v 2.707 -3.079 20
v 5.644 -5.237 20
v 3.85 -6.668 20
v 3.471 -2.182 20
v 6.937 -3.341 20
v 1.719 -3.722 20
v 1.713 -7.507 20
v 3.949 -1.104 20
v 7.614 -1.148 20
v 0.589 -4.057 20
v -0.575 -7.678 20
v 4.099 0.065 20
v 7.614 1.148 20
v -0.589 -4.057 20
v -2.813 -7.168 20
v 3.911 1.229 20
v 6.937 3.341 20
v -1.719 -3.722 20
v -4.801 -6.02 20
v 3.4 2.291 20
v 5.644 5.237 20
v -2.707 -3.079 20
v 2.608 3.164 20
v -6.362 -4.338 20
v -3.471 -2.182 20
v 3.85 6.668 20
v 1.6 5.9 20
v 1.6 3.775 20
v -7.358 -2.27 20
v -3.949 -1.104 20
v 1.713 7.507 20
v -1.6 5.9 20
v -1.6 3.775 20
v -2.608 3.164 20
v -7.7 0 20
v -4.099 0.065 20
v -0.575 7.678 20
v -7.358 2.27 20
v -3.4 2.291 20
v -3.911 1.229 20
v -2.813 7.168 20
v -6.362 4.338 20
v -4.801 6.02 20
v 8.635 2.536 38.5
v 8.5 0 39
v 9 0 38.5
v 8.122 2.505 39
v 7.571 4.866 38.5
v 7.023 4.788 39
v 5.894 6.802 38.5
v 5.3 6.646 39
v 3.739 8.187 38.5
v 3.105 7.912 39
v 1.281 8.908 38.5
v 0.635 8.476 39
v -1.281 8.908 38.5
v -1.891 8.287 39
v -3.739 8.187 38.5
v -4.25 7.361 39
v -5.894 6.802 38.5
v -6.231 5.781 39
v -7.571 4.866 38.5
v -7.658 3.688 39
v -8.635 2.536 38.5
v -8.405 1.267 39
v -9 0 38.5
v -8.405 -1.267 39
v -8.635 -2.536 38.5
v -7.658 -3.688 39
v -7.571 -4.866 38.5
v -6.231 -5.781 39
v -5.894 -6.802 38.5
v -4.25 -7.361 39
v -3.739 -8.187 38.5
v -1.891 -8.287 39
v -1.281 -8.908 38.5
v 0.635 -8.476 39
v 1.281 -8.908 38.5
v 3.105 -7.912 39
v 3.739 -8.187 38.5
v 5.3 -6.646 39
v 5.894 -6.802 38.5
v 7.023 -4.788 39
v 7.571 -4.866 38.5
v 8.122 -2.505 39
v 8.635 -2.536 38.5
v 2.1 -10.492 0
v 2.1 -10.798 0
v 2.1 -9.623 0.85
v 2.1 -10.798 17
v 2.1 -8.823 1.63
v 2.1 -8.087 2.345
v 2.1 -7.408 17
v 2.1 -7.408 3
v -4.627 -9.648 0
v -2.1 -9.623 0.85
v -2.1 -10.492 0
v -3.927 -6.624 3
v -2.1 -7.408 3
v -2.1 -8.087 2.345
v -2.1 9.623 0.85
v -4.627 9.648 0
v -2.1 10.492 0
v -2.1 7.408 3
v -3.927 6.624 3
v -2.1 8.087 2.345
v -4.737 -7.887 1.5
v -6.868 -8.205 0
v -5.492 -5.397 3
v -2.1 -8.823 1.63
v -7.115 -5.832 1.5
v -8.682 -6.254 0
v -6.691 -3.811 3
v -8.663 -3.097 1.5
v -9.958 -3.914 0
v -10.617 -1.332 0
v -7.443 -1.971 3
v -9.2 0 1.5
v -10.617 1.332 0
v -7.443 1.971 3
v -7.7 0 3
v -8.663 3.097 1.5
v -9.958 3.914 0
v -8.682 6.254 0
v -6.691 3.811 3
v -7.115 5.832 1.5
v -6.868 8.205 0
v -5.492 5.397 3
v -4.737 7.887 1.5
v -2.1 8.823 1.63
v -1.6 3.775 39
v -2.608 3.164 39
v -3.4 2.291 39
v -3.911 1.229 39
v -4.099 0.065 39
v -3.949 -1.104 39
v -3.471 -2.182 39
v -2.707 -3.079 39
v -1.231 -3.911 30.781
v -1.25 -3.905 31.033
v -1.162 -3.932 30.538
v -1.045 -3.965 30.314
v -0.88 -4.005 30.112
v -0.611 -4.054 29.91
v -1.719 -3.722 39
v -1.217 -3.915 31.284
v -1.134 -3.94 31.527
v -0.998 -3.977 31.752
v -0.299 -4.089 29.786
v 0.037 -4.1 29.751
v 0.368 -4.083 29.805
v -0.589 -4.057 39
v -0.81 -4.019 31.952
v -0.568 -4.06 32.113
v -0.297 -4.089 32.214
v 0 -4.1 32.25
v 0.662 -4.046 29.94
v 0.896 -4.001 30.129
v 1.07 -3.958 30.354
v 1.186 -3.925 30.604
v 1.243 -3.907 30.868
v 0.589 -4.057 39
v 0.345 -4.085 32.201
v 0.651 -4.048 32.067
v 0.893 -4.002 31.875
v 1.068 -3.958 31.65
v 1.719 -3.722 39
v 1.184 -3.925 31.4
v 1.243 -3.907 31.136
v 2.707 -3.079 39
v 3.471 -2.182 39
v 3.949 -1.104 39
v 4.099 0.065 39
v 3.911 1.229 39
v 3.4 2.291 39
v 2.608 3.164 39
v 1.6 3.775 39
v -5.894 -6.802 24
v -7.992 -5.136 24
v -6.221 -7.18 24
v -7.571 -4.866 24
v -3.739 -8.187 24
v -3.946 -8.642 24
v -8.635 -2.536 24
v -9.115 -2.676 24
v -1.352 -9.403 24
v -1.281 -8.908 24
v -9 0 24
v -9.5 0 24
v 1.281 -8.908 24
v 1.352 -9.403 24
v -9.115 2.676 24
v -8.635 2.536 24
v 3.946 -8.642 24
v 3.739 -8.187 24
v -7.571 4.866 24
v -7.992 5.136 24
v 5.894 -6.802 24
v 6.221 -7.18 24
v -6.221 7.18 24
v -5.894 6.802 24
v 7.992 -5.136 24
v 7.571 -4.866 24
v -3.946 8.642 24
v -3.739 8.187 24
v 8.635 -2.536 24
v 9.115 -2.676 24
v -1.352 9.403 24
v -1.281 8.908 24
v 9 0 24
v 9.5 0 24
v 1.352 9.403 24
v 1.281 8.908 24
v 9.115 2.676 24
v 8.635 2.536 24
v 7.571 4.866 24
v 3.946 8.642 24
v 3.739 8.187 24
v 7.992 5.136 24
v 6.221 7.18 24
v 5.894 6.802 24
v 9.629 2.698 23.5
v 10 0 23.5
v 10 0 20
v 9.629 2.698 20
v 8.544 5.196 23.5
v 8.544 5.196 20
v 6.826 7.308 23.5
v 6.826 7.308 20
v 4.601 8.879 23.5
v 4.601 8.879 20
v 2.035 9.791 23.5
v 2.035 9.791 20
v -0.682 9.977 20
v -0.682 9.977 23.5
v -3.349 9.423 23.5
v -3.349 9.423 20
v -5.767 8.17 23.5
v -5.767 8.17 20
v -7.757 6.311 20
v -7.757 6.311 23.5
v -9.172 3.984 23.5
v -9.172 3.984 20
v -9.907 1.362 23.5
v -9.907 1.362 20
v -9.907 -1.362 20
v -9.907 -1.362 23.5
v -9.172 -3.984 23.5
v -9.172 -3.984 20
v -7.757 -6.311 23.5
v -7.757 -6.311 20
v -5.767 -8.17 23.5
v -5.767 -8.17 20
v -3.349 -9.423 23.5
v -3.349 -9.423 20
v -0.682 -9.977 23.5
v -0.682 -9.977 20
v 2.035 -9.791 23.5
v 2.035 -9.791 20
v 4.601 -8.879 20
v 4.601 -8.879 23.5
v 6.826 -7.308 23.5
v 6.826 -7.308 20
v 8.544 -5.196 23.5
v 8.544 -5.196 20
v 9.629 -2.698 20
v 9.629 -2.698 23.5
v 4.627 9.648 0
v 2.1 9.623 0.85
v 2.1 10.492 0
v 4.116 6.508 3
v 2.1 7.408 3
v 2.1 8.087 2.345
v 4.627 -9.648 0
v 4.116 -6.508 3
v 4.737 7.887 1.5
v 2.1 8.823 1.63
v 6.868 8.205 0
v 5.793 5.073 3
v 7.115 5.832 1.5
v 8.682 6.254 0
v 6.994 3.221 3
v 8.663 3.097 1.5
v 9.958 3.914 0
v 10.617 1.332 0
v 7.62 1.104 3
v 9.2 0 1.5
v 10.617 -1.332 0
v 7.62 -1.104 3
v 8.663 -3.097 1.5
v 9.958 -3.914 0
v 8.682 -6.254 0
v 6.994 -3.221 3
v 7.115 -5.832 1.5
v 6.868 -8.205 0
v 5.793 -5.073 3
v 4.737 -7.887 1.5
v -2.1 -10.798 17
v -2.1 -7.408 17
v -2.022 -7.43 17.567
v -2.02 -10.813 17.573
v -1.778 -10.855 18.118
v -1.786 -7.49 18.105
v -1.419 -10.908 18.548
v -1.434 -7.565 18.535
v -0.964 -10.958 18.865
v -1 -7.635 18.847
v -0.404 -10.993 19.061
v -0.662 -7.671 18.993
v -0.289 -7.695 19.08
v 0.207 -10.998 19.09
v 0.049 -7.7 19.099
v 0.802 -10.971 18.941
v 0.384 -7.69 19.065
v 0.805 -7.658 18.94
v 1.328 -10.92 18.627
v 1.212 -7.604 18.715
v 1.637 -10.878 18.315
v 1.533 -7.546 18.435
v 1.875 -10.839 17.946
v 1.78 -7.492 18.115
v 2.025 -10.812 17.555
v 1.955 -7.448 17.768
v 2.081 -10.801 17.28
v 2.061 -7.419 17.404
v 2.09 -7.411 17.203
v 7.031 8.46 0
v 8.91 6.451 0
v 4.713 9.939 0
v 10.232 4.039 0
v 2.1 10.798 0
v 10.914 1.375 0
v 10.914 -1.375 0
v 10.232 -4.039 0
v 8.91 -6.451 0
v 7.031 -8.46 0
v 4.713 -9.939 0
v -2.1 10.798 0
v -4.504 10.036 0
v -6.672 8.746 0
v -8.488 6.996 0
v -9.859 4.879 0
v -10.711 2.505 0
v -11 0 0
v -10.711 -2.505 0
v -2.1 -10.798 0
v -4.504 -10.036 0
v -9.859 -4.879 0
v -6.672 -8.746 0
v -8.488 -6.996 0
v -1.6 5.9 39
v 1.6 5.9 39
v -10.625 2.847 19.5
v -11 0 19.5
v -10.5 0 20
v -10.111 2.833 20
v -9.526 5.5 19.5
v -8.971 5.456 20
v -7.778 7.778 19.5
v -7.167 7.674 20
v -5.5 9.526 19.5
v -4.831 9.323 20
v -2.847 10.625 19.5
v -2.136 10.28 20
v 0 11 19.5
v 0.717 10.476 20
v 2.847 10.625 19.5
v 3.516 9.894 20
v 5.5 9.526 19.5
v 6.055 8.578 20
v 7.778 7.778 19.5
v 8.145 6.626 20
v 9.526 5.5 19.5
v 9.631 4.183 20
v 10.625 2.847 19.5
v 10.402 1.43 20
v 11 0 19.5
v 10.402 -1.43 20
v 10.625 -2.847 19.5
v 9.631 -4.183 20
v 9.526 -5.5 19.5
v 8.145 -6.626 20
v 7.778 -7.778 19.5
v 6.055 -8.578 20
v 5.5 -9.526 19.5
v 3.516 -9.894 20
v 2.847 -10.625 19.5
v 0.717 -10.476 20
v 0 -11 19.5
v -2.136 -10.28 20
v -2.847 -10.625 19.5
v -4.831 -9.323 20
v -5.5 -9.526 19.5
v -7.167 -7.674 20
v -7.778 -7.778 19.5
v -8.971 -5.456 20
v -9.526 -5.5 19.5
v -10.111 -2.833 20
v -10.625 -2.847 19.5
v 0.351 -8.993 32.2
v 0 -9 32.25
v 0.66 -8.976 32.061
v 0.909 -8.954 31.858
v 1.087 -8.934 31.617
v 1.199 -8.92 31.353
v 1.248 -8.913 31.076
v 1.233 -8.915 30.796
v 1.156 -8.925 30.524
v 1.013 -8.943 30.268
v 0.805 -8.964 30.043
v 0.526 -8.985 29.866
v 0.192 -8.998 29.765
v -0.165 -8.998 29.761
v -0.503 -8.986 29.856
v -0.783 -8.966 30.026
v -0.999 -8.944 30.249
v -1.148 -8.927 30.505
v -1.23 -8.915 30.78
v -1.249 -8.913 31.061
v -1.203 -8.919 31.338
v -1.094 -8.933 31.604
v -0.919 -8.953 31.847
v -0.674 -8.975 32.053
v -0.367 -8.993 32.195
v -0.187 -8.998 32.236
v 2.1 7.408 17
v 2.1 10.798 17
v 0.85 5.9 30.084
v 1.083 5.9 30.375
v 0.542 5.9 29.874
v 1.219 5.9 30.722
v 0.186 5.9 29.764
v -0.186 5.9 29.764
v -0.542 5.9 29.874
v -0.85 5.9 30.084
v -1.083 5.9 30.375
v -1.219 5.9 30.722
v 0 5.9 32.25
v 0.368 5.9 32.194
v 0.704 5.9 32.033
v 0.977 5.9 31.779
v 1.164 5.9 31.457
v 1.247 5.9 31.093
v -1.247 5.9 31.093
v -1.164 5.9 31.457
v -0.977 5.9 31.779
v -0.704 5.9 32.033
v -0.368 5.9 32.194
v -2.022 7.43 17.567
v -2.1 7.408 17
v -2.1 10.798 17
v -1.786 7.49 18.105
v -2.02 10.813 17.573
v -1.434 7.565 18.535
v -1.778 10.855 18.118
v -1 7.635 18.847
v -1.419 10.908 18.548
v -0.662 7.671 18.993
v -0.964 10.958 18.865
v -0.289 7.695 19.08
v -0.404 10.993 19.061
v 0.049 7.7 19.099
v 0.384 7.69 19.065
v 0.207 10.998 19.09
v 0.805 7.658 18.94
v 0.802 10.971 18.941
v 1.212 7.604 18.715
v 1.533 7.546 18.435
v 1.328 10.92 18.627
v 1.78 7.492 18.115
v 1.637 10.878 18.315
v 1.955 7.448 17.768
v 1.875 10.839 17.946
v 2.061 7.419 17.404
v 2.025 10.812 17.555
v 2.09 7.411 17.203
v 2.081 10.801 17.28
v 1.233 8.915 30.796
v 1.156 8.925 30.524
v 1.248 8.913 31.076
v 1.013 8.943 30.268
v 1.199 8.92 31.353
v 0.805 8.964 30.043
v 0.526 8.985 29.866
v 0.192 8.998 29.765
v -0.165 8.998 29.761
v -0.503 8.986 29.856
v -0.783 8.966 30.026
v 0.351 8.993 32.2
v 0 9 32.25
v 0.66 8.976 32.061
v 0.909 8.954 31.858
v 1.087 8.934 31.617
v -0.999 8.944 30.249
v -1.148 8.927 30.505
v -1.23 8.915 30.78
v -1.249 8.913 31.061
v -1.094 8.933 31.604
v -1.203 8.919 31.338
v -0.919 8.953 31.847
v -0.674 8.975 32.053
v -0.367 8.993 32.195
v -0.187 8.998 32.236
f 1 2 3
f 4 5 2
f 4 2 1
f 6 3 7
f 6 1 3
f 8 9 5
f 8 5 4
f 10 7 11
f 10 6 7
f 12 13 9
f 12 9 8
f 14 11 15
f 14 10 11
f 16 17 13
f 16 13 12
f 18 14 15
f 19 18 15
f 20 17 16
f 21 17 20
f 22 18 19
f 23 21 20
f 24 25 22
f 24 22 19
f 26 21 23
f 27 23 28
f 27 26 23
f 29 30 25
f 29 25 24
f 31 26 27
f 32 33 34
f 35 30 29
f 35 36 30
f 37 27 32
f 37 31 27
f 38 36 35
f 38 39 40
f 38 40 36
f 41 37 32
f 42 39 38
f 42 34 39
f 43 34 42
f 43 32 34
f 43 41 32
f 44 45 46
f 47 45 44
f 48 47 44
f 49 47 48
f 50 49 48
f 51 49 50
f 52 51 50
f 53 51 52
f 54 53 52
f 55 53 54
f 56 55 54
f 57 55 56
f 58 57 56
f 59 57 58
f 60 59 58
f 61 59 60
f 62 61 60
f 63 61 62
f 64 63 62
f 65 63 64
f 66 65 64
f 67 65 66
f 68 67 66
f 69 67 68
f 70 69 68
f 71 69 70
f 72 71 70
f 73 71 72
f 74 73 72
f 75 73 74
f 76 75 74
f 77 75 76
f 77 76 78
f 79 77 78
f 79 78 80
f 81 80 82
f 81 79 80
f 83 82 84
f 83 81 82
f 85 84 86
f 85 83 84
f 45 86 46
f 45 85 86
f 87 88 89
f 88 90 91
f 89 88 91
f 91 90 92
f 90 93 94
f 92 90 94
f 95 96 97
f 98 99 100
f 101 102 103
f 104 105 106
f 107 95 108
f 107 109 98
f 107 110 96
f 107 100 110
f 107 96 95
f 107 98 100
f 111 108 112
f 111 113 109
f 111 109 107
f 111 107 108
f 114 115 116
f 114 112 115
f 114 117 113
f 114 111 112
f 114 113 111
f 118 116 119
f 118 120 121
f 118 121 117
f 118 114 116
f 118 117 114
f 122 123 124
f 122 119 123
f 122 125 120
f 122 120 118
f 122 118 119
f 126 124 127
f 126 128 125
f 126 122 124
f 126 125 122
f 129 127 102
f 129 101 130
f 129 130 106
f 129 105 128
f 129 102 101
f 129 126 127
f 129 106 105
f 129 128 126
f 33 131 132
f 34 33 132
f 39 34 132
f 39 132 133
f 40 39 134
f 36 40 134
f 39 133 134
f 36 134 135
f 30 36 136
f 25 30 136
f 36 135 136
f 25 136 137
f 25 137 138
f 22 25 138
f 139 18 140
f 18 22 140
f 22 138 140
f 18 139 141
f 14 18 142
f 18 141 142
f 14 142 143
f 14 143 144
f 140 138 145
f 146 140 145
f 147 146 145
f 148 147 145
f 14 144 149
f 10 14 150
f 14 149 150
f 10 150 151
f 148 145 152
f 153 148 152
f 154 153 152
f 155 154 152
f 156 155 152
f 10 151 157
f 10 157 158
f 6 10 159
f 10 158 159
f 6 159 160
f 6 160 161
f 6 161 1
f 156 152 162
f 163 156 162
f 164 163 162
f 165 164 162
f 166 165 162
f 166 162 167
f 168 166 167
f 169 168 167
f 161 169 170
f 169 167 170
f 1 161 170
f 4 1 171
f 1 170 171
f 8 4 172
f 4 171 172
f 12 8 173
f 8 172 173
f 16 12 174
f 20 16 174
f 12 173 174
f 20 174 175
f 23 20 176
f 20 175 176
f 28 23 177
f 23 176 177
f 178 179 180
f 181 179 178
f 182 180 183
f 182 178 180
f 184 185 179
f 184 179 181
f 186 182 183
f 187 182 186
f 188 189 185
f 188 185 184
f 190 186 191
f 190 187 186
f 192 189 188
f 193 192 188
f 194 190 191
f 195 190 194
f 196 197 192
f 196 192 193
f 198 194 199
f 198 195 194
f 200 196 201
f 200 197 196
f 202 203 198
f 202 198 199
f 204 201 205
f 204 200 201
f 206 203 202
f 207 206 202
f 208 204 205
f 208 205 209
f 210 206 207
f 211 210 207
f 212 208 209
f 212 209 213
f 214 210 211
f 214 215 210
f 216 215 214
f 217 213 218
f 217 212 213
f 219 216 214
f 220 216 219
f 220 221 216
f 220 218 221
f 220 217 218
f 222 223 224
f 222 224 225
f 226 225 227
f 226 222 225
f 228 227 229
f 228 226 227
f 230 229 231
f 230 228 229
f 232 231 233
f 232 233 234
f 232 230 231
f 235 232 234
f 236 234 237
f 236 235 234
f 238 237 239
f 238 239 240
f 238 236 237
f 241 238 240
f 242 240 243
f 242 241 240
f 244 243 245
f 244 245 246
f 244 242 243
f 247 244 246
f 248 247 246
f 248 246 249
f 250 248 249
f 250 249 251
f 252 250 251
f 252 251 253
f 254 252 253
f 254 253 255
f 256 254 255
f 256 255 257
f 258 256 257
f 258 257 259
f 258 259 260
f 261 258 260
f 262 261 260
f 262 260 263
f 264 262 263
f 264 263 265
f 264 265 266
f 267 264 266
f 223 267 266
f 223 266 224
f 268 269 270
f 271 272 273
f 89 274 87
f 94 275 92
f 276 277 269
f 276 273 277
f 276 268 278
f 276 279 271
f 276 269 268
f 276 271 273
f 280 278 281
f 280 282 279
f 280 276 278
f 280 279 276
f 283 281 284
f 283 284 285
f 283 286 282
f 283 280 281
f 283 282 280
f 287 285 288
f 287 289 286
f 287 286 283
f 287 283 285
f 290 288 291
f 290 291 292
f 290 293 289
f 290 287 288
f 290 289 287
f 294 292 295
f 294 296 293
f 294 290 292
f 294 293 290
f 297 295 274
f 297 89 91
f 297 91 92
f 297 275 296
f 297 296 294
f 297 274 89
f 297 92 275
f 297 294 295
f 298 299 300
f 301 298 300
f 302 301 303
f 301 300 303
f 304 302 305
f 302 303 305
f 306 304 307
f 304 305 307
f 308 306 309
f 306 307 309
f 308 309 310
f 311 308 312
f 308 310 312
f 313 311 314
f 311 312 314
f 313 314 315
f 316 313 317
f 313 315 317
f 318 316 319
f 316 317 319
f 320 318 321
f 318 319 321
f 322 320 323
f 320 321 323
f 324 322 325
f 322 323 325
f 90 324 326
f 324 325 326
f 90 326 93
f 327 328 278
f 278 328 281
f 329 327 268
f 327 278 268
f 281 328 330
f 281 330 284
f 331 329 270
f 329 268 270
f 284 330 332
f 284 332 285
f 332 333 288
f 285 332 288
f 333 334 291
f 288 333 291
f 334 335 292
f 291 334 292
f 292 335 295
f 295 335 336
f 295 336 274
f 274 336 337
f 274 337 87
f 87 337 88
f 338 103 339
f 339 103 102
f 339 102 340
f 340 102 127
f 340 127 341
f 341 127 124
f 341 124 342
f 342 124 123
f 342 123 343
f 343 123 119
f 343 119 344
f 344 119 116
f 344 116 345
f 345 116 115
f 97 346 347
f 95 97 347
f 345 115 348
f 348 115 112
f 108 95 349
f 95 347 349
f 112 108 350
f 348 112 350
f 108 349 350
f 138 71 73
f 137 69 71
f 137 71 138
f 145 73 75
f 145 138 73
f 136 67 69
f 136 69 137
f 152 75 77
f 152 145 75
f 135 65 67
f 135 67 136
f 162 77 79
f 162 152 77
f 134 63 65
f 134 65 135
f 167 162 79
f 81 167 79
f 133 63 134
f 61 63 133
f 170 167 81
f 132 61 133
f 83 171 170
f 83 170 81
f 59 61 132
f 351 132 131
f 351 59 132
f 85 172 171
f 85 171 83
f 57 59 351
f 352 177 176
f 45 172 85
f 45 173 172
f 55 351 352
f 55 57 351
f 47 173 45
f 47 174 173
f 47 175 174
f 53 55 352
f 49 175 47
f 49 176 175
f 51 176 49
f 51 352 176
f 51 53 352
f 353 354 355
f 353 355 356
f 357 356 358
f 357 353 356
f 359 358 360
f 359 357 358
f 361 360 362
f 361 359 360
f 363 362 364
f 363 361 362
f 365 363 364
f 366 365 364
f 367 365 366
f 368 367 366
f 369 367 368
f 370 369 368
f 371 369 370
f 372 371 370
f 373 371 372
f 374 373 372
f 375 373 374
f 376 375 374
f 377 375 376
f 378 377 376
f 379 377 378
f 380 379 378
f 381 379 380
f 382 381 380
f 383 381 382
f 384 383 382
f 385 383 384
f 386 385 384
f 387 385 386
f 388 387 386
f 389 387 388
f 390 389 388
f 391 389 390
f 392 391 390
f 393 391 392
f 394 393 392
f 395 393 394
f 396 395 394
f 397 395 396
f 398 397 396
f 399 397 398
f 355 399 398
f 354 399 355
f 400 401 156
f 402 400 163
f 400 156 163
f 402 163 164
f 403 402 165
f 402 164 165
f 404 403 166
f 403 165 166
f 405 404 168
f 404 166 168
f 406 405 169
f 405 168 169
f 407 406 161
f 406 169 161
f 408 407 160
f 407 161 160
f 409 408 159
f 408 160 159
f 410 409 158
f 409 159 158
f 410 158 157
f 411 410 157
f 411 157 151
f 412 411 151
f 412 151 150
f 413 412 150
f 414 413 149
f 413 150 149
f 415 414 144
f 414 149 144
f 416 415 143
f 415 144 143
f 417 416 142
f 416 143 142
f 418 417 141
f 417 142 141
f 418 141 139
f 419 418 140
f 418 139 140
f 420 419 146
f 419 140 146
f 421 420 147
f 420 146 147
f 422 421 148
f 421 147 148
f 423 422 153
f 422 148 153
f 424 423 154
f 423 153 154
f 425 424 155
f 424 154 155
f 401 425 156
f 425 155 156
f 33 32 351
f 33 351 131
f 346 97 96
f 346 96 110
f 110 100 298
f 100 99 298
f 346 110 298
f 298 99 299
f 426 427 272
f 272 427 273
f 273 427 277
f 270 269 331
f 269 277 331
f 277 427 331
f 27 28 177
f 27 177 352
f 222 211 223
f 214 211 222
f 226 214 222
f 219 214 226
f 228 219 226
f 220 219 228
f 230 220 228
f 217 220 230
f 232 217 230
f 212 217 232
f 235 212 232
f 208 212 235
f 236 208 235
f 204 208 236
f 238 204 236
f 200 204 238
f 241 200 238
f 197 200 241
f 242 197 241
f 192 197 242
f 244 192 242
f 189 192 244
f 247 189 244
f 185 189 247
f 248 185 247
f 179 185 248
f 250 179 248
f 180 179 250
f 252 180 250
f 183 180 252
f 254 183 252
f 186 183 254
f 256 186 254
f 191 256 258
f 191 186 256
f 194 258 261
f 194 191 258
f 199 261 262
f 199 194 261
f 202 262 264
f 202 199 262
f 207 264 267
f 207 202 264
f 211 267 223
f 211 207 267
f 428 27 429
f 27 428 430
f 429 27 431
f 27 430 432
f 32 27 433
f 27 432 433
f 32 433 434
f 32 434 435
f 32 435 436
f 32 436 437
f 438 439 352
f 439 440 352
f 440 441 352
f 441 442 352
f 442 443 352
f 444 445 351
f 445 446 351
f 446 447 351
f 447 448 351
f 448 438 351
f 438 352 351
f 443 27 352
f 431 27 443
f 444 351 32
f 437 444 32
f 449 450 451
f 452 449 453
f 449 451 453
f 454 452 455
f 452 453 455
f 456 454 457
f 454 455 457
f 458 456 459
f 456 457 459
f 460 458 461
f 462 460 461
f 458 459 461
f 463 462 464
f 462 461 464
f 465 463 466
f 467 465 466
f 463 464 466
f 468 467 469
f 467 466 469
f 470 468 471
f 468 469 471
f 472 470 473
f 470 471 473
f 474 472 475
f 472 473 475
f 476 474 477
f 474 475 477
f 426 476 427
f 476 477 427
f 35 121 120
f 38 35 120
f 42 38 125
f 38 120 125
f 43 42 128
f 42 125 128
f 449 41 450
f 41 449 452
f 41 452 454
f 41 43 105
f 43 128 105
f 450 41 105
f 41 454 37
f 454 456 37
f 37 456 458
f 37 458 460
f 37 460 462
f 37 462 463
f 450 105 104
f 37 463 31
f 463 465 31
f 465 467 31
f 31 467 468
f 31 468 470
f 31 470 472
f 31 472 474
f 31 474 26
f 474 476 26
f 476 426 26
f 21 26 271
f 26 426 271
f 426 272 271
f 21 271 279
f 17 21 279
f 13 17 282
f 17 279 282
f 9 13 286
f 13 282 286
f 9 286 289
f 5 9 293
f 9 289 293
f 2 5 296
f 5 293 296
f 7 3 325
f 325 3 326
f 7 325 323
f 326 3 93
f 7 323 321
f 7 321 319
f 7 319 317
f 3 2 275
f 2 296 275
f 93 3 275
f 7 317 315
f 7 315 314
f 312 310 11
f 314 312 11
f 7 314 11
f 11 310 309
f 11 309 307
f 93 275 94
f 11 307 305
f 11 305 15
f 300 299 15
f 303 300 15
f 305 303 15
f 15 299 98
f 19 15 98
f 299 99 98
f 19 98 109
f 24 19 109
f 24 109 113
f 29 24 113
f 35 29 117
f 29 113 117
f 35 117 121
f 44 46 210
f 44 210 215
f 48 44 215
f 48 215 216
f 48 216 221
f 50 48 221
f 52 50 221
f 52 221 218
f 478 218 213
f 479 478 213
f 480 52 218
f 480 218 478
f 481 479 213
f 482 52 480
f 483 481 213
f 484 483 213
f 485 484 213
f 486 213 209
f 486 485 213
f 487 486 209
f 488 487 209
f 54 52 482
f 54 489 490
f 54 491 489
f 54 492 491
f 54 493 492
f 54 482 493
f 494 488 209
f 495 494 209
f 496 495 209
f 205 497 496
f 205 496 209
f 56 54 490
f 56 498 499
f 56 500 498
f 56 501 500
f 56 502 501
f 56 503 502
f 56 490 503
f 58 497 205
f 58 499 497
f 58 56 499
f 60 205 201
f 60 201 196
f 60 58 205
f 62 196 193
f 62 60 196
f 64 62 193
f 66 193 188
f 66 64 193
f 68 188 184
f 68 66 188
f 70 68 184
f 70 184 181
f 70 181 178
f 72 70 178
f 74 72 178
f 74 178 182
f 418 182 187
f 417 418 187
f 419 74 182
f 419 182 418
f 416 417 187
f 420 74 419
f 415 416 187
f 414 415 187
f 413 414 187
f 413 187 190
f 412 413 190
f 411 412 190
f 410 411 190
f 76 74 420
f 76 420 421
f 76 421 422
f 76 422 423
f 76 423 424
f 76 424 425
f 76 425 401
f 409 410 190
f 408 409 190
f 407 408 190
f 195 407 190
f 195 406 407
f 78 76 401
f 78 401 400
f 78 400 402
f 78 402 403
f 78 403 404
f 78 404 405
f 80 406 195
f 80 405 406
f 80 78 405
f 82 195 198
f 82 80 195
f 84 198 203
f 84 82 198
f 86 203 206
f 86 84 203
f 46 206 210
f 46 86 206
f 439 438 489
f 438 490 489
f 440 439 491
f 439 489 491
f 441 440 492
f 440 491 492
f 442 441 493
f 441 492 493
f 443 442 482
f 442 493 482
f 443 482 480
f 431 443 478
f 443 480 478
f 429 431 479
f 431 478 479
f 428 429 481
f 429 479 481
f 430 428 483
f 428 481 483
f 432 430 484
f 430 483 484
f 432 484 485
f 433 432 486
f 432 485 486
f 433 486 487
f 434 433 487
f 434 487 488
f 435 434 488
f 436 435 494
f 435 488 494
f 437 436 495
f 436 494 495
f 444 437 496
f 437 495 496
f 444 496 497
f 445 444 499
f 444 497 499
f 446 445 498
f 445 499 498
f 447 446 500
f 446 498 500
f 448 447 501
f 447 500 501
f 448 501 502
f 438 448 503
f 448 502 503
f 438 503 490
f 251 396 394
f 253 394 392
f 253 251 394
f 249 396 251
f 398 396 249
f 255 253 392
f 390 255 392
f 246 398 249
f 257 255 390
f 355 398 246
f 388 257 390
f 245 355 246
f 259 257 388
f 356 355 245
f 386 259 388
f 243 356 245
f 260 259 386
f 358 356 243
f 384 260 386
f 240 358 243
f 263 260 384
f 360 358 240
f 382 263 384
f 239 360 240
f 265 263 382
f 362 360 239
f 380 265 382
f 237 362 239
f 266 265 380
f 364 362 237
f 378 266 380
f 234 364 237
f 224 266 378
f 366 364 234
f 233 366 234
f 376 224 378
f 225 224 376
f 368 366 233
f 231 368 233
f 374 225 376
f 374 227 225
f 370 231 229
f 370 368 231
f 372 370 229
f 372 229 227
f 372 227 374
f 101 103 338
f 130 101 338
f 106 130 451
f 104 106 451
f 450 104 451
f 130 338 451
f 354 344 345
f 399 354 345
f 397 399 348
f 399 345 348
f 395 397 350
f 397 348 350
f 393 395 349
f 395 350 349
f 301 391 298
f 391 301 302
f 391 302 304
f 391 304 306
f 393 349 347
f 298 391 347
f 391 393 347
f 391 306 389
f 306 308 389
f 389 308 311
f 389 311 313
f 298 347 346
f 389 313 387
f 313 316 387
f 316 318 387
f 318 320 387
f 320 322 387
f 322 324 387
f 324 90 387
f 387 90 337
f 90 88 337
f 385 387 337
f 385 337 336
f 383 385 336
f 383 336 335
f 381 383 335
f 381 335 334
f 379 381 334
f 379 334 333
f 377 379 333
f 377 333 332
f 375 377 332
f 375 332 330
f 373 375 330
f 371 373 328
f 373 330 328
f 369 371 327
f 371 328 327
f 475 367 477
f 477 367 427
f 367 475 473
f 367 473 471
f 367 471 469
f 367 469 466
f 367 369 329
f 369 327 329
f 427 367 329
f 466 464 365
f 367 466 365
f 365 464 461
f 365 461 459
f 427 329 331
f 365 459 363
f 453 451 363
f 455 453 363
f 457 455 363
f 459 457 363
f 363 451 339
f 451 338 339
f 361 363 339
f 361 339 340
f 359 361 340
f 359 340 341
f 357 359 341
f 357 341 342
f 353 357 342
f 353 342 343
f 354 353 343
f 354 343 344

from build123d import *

# Parameters (mm, degrees)
SKETCH_1_R           = 11
EXTRUDE_1_DEPTH      = 29
SKETCH_2_OUTSIDE_W   = 32.506
SKETCH_2_OUTSIDE_H   = 32.506
SKETCH_2_OUTSIDE_R   = 10
CUT_EXTRUDE_1_DEPTH  = 9
SKETCH_3_R           = 7.7
CUT_EXTRUDE_2_DEPTH  = 20
SKETCH_4_R           = 2.1
CUT_EXTRUDE_3_DEPTH  = 25
CHAMFER_1_SIZE       = 3
EXTRUDE_START        = 10
SKETCH_5_R           = 10
EXTRUDE_2_DEPTH      = 10
SKETCH_6_R           = 4
CUT_EXTRUDE_5_DEPTH  = 19
SKETCH_8_OUTSIDE_W   = 33.978
SKETCH_8_OUTSIDE_H   = 33.978
SKETCH_8_OUTSIDE_R   = 9
CUT_EXTRUDE_7_DEPTH  = 15
SKETCH_9_R           = 1.25
CUT_EXTRUDE_8_DEPTH  = 25
CHAMFER_3_SIZE       = 0.5
CUT_EXTRUDE_9_DEPTH  = 19
CUT_EXTRUDE_10_DEPTH = 19


with BuildPart() as part:
    # 草图1 → 凸台-拉伸1 (new body)
    with BuildSketch(Plane.XY):
        with Locations(Location((0, 0, 0), (0, 0, 180))):
            Circle(SKETCH_1_R)
    extrude(amount=EXTRUDE_1_DEPTH)

    # 草图2 outside → 切除-拉伸1 (cut)
    with BuildSketch(Plane.XY.offset(29)):
        Rectangle(SKETCH_2_OUTSIDE_W, SKETCH_2_OUTSIDE_H)
        Circle(SKETCH_2_OUTSIDE_R, mode=Mode.SUBTRACT)
    extrude(amount=-CUT_EXTRUDE_1_DEPTH, mode=Mode.SUBTRACT)

    # 草图3 → 切除-拉伸2 (cut)
    with BuildSketch(Plane(origin=(0, 0, 0), x_dir=(-1, 0, 0), z_dir=(0, 0, -1))):
        Circle(SKETCH_3_R)
    extrude(amount=-CUT_EXTRUDE_2_DEPTH, mode=Mode.SUBTRACT)

    # 草图4 → 切除-拉伸3 (cut, symmetric)
    with BuildSketch(Plane(origin=(0, 0, 0), x_dir=(1, 0, 0), z_dir=(0, 1, 0))):
        with BuildLine():
            Line((-2.1, 0), (-2.1, -17))
            ThreePointArc((-2.1, -17), (0, -14.9), (2.1, -17))
            Line((2.1, -17), (2.1, 0))
            Line((2.1, 0), (-2.1, 0))
        make_face()
        with Locations((0, -17)):
            Circle(SKETCH_4_R)
    extrude(amount=CUT_EXTRUDE_3_DEPTH, both=True, mode=Mode.SUBTRACT)

    # 倒角1
    chamfer_1_edges = [part.edges().sort_by_distance(p)[0] for p in [
        (7.7, 0, 0),
        (-6.142475071, -4.643274706, 0),
    ]]
    chamfer(chamfer_1_edges, length=CHAMFER_1_SIZE)

    # 草图5 → 凸台-拉伸2 (add)
    with BuildSketch(Plane.XY.offset(29).offset(EXTRUDE_START)):
        Circle(SKETCH_5_R)
    extrude(amount=-EXTRUDE_2_DEPTH)

    # 草图6 → 切除-拉伸5 (cut)
    with BuildSketch(Plane.XY.offset(39)):
        Circle(SKETCH_6_R)
    extrude(amount=-CUT_EXTRUDE_5_DEPTH, mode=Mode.SUBTRACT)

    # 草图8 outside → 切除-拉伸7 (cut)
    with BuildSketch(Plane.XY.offset(39)):
        Rectangle(SKETCH_8_OUTSIDE_W, SKETCH_8_OUTSIDE_H)
        Circle(SKETCH_8_OUTSIDE_R, mode=Mode.SUBTRACT)
    extrude(amount=-CUT_EXTRUDE_7_DEPTH, mode=Mode.SUBTRACT)

    # 草图9 → 切除-拉伸8 (cut, symmetric)
    with BuildSketch(Plane(origin=(0, 0, 0), x_dir=(1, 0, 0), z_dir=(0, 1, 0))):
        with Locations(Location((0, -31, 0), (0, 0, 270))):
            Circle(SKETCH_9_R)
    extrude(amount=CUT_EXTRUDE_8_DEPTH, both=True, mode=Mode.SUBTRACT)

    # 倒角3
    chamfer_3_edges = [part.edges().sort_by_distance(p)[0] for p in [
        (-10, 0, 24),
        (-9, 0, 39),
        (11, 0, 20),
    ]]
    chamfer(chamfer_3_edges, length=CHAMFER_3_SIZE)

    # 草图10 → 切除-拉伸9 (cut)
    with BuildSketch(Plane.XY.offset(39)):
        with BuildLine():
            Line((0, 5.8), (0, 4))
            ThreePointArc((0, 4), (0.76406905, 3.92634671), (1.5, 3.708099244))
            Line((1.5, 3.708099244), (1.5, 5.8))
            Line((1.5, 5.8), (0, 5.8))
        make_face()
        with BuildLine():
            ThreePointArc((-1.5, 3.708099244), (-0.76406905, 3.92634671), (0, 4))
            Line((0, 4), (0, 5.8))
            Line((0, 5.8), (-1.5, 5.8))
            Line((-1.5, 5.8), (-1.5, 3.708099244))
        make_face()
    extrude(amount=-CUT_EXTRUDE_9_DEPTH, mode=Mode.SUBTRACT)

    # 草图11 → 切除-拉伸10 (cut)
    with BuildSketch(Plane.XY.offset(39)):
        with BuildLine():
            Line((1.6, 3.774917218), (1.6, 5.9))
            Line((1.6, 5.9), (-1.6, 5.9))
            Line((-1.6, 5.9), (-1.6, 3.774917218))
            ThreePointArc((-1.6, 3.774917218), (0, -4.1), (1.6, 3.774917218))
        make_face()
    extrude(amount=-CUT_EXTRUDE_10_DEPTH, mode=Mode.SUBTRACT)


solid = part.part
